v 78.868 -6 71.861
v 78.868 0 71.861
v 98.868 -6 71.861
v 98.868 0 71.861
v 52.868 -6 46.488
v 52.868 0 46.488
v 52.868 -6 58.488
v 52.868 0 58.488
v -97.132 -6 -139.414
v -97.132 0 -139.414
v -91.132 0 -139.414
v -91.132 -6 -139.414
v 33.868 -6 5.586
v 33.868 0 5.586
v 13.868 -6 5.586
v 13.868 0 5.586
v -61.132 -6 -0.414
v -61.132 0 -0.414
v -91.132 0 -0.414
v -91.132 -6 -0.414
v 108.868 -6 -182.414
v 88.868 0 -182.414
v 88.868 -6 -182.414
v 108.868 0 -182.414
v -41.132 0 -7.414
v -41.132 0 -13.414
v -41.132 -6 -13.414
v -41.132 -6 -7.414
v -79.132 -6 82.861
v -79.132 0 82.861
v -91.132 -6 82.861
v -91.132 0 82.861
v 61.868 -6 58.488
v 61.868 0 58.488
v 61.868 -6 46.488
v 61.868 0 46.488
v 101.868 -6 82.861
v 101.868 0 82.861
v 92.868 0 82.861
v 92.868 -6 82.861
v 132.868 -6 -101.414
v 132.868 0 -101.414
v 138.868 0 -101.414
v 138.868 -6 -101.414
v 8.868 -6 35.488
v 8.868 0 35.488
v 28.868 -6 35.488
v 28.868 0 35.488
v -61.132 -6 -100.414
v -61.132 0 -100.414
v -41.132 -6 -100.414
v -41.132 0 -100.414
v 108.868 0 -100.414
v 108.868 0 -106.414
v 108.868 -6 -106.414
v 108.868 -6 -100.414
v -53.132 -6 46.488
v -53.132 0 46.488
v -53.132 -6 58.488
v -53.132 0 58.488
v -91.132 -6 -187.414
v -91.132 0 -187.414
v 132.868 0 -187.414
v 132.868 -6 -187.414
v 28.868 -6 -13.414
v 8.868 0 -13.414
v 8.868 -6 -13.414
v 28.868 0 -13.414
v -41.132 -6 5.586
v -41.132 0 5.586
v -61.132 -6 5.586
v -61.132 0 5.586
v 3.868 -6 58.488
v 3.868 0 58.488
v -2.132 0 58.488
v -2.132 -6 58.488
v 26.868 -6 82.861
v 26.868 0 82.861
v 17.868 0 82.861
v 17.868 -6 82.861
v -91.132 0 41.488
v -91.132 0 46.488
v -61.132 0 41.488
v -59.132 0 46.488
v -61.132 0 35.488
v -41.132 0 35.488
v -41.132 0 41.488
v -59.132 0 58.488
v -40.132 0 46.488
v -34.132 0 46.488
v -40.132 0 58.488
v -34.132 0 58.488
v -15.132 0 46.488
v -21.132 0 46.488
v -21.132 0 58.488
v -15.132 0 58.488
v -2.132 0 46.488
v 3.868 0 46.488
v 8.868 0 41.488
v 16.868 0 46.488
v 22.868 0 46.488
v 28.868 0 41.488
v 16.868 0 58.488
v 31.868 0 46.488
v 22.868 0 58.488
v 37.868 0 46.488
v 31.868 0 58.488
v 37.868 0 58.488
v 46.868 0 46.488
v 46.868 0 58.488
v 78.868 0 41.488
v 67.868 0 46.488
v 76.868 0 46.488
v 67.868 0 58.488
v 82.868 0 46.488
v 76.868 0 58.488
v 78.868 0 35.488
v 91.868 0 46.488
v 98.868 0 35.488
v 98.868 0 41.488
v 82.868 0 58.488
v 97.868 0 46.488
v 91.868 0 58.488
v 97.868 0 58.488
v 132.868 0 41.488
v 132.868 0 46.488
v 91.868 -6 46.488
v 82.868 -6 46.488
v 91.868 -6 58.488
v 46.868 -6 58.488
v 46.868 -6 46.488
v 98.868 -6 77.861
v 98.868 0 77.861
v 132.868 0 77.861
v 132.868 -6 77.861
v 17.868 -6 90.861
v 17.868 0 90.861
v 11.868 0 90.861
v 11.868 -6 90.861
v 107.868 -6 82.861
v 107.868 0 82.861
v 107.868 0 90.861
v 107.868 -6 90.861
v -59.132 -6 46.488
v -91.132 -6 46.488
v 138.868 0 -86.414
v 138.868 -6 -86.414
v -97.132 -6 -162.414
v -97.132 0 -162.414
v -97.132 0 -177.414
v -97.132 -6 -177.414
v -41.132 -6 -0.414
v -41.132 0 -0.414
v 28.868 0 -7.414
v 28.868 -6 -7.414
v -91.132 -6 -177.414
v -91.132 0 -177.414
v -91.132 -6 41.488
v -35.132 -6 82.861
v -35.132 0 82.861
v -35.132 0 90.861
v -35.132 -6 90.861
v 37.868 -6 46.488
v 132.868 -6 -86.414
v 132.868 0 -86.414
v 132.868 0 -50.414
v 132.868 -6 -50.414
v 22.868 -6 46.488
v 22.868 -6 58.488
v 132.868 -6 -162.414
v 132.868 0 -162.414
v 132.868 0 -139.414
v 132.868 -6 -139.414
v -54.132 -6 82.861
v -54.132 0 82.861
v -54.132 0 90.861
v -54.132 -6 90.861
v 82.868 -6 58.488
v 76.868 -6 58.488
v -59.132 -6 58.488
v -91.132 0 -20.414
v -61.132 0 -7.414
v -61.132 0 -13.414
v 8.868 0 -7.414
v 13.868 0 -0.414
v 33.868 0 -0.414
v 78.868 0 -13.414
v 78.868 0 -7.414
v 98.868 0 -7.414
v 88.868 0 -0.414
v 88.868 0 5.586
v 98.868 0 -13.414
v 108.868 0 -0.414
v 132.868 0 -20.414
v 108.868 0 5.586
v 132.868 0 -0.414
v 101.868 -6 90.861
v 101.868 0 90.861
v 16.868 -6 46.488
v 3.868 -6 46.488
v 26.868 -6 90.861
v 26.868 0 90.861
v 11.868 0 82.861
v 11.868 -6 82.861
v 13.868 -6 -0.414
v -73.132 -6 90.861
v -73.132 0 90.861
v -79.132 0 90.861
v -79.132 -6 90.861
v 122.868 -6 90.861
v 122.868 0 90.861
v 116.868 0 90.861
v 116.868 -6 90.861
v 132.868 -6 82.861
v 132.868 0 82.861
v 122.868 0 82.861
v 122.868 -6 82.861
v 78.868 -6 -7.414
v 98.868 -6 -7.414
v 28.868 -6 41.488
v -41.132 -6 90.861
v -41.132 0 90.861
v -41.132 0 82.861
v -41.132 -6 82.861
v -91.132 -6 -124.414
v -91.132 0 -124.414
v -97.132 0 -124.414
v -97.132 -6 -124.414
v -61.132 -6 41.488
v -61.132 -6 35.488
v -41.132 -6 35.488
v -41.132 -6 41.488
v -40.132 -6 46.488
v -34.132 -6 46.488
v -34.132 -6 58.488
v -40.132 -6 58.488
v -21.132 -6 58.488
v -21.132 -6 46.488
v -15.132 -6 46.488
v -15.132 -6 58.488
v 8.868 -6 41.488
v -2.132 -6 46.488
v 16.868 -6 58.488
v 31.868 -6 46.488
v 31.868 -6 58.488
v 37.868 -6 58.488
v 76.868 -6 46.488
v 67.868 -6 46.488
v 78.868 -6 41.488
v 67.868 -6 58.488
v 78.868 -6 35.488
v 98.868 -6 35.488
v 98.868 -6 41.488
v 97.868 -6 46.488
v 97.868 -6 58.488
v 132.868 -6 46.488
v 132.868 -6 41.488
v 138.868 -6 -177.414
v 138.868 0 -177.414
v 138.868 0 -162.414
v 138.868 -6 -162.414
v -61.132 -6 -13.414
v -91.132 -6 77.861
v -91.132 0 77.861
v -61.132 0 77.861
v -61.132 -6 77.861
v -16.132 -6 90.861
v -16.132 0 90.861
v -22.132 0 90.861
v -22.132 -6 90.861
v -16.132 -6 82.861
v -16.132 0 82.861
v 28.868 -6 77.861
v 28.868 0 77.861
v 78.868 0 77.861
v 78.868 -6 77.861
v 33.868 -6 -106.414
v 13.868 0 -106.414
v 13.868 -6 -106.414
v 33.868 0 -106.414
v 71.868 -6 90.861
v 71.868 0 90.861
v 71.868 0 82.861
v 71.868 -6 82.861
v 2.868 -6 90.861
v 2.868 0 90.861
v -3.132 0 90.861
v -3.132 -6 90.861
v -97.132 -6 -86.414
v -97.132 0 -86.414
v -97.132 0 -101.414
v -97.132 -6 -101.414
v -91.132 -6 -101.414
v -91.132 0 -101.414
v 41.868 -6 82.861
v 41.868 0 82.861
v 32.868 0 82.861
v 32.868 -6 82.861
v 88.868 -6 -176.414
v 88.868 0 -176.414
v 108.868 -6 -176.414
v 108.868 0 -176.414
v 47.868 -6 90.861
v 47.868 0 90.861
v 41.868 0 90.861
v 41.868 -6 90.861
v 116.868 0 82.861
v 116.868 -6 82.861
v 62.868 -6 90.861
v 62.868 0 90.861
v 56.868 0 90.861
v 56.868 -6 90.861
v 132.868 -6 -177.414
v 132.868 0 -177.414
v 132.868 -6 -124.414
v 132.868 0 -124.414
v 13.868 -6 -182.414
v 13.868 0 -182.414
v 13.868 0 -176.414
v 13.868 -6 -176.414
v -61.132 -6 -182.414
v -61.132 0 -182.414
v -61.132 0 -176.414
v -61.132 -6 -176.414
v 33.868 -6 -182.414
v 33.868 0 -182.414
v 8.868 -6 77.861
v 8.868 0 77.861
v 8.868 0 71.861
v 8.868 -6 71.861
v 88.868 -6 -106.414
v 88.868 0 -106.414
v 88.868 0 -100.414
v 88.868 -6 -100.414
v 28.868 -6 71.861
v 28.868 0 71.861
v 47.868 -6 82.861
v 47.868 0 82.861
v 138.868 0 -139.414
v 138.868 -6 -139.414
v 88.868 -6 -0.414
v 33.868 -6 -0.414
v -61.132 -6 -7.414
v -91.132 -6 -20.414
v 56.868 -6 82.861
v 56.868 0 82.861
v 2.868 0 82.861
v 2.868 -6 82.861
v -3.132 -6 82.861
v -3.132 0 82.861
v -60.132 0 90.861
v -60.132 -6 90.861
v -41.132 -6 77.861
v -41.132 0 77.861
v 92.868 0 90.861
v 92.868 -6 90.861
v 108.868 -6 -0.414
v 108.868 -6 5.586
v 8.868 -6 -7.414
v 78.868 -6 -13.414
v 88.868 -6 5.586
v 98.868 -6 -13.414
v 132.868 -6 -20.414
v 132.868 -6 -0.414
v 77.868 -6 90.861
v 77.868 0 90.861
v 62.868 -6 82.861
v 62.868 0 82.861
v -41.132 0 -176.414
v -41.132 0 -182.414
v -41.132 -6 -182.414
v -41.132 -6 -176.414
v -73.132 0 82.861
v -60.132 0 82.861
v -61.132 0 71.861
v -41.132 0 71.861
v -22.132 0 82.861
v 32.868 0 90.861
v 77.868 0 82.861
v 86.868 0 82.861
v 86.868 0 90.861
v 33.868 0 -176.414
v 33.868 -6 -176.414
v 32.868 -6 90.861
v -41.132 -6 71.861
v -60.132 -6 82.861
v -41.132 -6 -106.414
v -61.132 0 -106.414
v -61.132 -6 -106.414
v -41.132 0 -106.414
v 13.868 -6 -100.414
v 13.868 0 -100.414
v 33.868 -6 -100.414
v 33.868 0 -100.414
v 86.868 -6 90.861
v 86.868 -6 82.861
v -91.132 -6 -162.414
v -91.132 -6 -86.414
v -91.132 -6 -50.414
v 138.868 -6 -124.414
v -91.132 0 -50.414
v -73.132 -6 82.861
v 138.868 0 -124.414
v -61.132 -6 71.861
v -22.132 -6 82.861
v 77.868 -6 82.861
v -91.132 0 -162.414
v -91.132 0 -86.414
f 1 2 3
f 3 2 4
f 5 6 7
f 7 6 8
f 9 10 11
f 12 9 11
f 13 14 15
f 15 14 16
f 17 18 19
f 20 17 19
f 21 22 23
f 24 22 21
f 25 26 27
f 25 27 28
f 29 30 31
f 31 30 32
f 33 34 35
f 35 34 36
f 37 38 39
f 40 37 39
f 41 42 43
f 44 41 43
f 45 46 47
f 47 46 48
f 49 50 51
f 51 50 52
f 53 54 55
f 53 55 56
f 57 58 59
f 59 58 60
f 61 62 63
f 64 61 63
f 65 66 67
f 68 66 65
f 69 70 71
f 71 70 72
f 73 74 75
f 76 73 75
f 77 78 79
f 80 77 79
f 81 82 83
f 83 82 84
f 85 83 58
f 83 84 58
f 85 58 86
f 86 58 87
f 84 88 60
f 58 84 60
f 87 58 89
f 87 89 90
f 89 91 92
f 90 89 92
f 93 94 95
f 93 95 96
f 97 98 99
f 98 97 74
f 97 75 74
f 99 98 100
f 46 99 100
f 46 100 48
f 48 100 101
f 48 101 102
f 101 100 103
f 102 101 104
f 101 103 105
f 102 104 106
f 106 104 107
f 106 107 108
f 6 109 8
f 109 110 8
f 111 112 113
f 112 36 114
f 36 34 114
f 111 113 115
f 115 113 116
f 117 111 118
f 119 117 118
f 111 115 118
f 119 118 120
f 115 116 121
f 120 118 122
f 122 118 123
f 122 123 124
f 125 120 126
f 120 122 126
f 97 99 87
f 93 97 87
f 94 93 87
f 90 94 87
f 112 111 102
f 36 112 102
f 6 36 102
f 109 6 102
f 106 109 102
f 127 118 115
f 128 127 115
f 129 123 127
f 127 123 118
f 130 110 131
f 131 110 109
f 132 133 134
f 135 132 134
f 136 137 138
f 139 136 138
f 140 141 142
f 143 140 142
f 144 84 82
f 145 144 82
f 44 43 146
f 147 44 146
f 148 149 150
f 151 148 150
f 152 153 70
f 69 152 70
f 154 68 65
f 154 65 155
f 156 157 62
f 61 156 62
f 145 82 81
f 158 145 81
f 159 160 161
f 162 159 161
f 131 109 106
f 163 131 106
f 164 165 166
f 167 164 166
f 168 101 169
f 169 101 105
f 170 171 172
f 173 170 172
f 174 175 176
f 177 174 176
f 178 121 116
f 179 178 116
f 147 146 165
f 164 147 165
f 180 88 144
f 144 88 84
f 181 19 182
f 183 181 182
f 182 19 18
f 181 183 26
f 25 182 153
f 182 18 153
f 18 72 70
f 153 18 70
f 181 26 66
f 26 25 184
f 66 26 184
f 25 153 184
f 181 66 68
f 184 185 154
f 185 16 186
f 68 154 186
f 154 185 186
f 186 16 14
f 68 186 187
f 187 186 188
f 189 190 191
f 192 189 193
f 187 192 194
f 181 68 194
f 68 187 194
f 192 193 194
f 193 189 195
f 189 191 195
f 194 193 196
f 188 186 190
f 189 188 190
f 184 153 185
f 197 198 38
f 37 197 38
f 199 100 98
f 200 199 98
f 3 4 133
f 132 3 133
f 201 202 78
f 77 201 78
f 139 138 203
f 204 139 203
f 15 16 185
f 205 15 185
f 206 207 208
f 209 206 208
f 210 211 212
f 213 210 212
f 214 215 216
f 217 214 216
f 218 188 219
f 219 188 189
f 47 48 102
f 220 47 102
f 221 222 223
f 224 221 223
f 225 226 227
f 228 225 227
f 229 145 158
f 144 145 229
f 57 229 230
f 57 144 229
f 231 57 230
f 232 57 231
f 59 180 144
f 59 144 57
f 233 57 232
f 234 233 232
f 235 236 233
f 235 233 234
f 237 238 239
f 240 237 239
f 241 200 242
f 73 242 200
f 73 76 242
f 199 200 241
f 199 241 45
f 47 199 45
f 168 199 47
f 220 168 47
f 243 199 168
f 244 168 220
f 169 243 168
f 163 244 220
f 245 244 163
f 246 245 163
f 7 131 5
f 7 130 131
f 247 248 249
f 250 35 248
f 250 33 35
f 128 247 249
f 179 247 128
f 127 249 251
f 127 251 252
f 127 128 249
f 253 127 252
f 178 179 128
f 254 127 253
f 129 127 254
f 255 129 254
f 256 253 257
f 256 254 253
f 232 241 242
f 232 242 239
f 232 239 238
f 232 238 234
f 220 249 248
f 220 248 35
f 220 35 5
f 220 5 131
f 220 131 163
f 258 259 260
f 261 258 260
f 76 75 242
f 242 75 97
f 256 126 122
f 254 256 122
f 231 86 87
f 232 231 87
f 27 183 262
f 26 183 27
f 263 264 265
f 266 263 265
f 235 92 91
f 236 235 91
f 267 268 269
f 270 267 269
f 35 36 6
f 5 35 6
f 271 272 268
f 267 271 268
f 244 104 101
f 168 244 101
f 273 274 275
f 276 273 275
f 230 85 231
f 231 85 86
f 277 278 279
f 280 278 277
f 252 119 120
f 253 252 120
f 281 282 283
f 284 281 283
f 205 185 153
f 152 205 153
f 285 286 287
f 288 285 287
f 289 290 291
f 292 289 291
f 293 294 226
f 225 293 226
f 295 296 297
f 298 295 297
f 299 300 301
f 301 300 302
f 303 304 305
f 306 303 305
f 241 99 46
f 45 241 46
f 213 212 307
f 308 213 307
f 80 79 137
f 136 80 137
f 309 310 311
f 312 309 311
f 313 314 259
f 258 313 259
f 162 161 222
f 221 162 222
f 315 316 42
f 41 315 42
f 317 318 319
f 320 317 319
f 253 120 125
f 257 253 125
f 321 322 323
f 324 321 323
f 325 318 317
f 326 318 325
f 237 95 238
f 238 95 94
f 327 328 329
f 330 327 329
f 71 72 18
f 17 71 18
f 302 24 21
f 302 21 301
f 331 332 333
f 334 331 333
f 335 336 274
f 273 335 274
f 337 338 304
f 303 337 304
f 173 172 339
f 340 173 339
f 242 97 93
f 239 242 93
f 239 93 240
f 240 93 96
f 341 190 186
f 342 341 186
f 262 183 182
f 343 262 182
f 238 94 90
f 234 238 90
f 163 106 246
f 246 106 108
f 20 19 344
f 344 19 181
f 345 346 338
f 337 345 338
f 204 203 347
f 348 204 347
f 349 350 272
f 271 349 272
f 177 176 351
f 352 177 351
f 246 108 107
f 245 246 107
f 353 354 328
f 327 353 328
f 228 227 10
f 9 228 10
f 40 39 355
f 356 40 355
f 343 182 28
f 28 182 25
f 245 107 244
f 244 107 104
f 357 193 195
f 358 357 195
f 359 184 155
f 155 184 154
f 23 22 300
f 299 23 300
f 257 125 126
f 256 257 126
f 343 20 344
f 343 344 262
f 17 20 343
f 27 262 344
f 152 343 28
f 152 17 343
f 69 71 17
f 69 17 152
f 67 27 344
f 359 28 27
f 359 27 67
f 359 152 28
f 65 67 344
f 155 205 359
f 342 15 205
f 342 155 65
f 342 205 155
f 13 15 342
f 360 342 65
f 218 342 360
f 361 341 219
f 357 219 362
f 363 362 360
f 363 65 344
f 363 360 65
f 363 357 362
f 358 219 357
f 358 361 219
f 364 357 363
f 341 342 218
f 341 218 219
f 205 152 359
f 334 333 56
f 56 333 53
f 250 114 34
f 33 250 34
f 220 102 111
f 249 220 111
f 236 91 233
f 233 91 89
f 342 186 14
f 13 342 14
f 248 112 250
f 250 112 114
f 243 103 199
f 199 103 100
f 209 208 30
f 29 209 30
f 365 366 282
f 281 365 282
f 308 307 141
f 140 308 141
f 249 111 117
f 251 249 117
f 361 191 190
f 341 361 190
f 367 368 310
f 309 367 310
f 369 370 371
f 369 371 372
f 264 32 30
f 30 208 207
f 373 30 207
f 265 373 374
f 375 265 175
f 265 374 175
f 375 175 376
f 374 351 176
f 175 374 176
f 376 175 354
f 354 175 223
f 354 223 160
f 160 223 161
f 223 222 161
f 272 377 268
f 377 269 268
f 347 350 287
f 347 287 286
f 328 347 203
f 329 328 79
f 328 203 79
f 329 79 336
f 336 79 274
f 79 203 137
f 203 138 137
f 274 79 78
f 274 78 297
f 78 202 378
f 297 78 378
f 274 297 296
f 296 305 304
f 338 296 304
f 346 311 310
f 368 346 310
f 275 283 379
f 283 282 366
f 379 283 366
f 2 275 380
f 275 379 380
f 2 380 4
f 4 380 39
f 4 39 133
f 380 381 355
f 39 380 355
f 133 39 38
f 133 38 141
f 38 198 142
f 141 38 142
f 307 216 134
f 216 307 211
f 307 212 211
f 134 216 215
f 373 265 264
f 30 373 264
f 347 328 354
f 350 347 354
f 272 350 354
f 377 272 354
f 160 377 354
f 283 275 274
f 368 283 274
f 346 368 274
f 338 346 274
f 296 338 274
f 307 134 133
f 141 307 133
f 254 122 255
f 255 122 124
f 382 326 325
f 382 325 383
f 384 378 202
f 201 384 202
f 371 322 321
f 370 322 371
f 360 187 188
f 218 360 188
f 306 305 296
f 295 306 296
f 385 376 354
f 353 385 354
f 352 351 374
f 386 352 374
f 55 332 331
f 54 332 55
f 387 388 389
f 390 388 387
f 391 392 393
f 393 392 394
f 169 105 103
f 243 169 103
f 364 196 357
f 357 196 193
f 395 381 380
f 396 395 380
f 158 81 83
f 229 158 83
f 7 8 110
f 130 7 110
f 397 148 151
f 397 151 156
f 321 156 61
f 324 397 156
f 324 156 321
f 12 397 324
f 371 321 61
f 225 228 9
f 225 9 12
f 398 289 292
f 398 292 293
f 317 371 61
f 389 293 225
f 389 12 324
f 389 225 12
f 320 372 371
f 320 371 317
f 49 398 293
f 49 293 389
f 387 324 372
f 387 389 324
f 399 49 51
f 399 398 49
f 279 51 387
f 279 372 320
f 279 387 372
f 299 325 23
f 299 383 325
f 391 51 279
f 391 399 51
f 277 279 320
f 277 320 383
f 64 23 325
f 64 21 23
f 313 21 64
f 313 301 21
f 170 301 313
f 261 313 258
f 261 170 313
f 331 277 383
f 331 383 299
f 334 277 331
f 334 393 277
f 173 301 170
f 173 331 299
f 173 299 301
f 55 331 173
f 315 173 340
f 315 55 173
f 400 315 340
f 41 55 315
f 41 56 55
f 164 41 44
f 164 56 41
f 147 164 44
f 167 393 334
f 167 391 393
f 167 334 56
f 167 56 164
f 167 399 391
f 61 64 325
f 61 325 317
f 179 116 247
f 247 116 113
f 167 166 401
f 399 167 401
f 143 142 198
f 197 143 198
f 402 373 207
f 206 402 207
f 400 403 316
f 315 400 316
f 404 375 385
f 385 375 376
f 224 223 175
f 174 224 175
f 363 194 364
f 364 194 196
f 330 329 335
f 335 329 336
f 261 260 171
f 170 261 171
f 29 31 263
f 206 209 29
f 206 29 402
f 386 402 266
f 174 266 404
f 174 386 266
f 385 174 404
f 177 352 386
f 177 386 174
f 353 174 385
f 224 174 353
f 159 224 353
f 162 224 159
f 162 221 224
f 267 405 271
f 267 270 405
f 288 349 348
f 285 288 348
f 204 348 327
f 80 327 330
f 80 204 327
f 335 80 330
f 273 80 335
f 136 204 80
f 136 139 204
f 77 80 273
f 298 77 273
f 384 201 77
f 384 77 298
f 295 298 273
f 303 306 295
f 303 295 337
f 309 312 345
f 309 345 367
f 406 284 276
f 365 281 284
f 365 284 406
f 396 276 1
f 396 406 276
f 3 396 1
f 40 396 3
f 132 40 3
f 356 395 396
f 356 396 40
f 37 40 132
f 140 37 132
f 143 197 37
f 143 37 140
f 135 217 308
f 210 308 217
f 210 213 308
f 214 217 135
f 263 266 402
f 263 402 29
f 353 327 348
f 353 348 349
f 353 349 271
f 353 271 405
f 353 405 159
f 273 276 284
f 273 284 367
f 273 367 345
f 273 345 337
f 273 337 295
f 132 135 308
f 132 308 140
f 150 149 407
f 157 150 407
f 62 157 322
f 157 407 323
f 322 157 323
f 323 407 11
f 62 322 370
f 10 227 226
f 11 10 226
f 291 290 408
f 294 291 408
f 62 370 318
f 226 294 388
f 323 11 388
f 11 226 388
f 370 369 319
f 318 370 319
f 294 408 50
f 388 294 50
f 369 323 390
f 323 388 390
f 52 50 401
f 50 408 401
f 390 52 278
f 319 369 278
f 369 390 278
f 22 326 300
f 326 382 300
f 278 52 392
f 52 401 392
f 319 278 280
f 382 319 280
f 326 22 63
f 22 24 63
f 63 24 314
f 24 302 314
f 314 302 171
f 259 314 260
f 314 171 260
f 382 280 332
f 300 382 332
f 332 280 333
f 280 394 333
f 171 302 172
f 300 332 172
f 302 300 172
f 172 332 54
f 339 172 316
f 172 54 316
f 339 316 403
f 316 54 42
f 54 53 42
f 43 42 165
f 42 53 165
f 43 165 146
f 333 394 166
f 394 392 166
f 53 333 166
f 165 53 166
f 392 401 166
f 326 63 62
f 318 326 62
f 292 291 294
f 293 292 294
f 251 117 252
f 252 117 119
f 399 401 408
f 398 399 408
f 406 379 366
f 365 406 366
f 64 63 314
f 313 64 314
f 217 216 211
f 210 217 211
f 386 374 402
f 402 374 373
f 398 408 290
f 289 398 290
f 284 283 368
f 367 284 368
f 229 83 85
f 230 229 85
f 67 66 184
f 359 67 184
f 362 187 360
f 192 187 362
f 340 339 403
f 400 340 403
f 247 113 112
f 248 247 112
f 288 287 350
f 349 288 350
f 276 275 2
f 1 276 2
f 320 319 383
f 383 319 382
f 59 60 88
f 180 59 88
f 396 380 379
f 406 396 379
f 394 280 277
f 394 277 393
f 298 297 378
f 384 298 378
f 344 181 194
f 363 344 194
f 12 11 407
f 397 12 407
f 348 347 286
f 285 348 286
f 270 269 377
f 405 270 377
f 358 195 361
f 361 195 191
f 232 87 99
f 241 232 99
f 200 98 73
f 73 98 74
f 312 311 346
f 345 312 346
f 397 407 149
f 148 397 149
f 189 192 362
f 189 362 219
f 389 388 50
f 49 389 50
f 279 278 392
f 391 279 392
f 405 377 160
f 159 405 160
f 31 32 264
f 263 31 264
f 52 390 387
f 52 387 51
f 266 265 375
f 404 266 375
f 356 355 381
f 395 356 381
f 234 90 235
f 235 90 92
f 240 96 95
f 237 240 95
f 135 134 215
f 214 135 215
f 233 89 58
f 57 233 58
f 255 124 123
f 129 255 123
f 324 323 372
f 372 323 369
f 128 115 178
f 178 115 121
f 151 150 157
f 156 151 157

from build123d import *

# Parameters (mm, degrees)
F0_W     = 20
F0_H     = 6
F1_DEPTH = 6
F2_DEPTH = 6
F3_DEPTH = 6
F4_DEPTH = 6


with BuildPart() as f1:
    # F0 (on Front) → F1 (new body)
    with BuildSketch(Plane.XZ):
        Polygon((132.867928, -50.414), (-91.132072, -50.414), (-91.132072, -86.414), (-97.132072, -86.414), (-97.132072, -101.414), (-91.132072, -101.414), (-91.132072, -124.414), (-97.132072, -124.414), (-97.132072, -139.414), (-91.132072, -139.414), (-91.132072, -162.414), (-97.132072, -162.414), (-97.132072, -177.414), (-91.132072, -177.414), (-91.132072, -187.414), (132.867928, -187.414), (132.867928, -177.414), (138.867928, -177.414), (138.867928, -162.414), (132.867928, -162.414), (132.867928, -139.414), (138.867928, -139.414), (138.867928, -124.414), (132.867928, -124.414), (132.867928, -101.414), (138.867928, -101.414), (138.867928, -86.414), (132.867928, -86.414), align=None)
        with Locations((-51.132072, -179.414)):
            Rectangle(F0_W, F0_H, mode=Mode.SUBTRACT)
        with Locations((-51.132072, -103.414)):
            Rectangle(F0_W, F0_H, mode=Mode.SUBTRACT)
        with Locations((23.867928, -179.414)):
            Rectangle(F0_W, F0_H, mode=Mode.SUBTRACT)
        with Locations((98.867928, -179.414)):
            Rectangle(F0_W, F0_H, mode=Mode.SUBTRACT)
        with Locations((23.867928, -103.414)):
            Rectangle(F0_W, F0_H, mode=Mode.SUBTRACT)
        with Locations((98.867928, -103.414)):
            Rectangle(F0_W, F0_H, mode=Mode.SUBTRACT)
    extrude(amount=F1_DEPTH)


with BuildPart() as f2:
    # F0 (on Front) → F2 (new body)
    with BuildSketch(Plane.XZ):
        Polygon((-61.132072, -0.414), (-91.132072, -0.414), (-91.132072, -20.414), (132.867928, -20.414), (132.867928, -0.414), (108.867928, -0.414), (108.867928, 5.586), (88.867928, 5.586), (88.867928, -0.414), (33.867928, -0.414), (33.867928, 5.586), (13.867928, 5.586), (13.867928, -0.414), (-41.132072, -0.414), (-41.132072, 5.586), (-61.132072, 5.586), align=None)
        with Locations((-51.132072, -10.414)):
            Rectangle(F0_W, F0_H, mode=Mode.SUBTRACT)
        with Locations((18.867928, -10.414)):
            Rectangle(F0_W, F0_H, mode=Mode.SUBTRACT)
        with Locations((88.867928, -10.414)):
            Rectangle(F0_W, F0_H, mode=Mode.SUBTRACT)
    extrude(amount=F2_DEPTH)


with BuildPart() as f3:
    # F0 (on Front) → F3 (new body)
    with BuildSketch(Plane.XZ):
        Polygon((16.867928, 58.488489), (16.867928, 46.488489), (3.867928, 46.488489), (3.867928, 58.488489), (-2.132072, 58.488489), (-2.132072, 46.488489), (-15.132072, 46.488489), (-15.132072, 58.488489), (-21.132072, 58.488489), (-21.132072, 46.488489), (-34.132072, 46.488489), (-34.132072, 58.488489), (-40.132072, 58.488489), (-40.132072, 46.488489), (-53.132072, 46.488489), (-53.132072, 58.488489), (-59.132072, 58.488489), (-59.132072, 46.488489), (-91.132072, 46.488489), (-91.132072, 41.488489), (-61.132072, 41.488489), (-61.132072, 35.488489), (-41.132072, 35.488489), (-41.132072, 41.488489), (8.867928, 41.488489), (8.867928, 35.488489), (28.867928, 35.488489), (28.867928, 41.488489), (78.867928, 41.488489), (78.867928, 35.488489), (98.867928, 35.488489), (98.867928, 41.488489), (132.867928, 41.488489), (132.867928, 46.488489), (97.867928, 46.488489), (97.867928, 58.488489), (91.867928, 58.488489), (91.867928, 46.488489), (82.867928, 46.488489), (82.867928, 58.488489), (76.867928, 58.488489), (76.867928, 46.488489), (67.867928, 46.488489), (67.867928, 58.488489), (61.867928, 58.488489), (61.867928, 46.488489), (52.867928, 46.488489), (52.867928, 58.488489), (46.867928, 58.488489), (46.867928, 46.488489), (37.867928, 46.488489), (37.867928, 58.488489), (31.867928, 58.488489), (31.867928, 46.488489), (22.867928, 46.488489), (22.867928, 58.488489), align=None)
    extrude(amount=F3_DEPTH)


with BuildPart() as f4:
    # F0 (on Front) → F4 (new body)
    with BuildSketch(Plane.XZ):
        Polygon((-79.132072, 90.861088), (-79.132072, 82.861088), (-91.132072, 82.861088), (-91.132072, 77.861088), (-61.132072, 77.861088), (-61.132072, 71.861088), (-41.132072, 71.861088), (-41.132072, 77.861088), (8.867928, 77.861088), (8.867928, 71.861088), (28.867928, 71.861088), (28.867928, 77.861088), (78.867928, 77.861088), (78.867928, 71.861088), (98.867928, 71.861088), (98.867928, 77.861088), (132.867928, 77.861088), (132.867928, 82.861088), (122.867928, 82.861088), (122.867928, 90.861088), (116.867928, 90.861088), (116.867928, 82.861088), (107.867928, 82.861088), (107.867928, 90.861088), (101.867928, 90.861088), (101.867928, 82.861088), (92.867928, 82.861088), (92.867928, 90.861088), (86.867928, 90.861088), (86.867928, 82.861088), (77.867928, 82.861088), (77.867928, 90.861088), (71.867928, 90.861088), (71.867928, 82.861088), (62.867928, 82.861088), (62.867928, 90.861088), (56.867928, 90.861088), (56.867928, 82.861088), (47.867928, 82.861088), (47.867928, 90.861088), (41.867928, 90.861088), (41.867928, 82.861088), (32.867928, 82.861088), (32.867928, 90.861088), (26.867928, 90.861088), (26.867928, 82.861088), (17.867928, 82.861088), (17.867928, 90.861088), (11.867928, 90.861088), (11.867928, 82.861088), (2.867928, 82.861088), (2.867928, 90.861088), (-3.132072, 90.861088), (-3.132072, 82.861088), (-16.132072, 82.861088), (-16.132072, 90.861088), (-22.132072, 90.861088), (-22.132072, 82.861088), (-35.132072, 82.861088), (-35.132072, 90.861088), (-41.132072, 90.861088), (-41.132072, 82.861088), (-54.132072, 82.861088), (-54.132072, 90.861088), (-60.132072, 90.861088), (-60.132072, 82.861088), (-73.132072, 82.861088), (-73.132072, 90.861088), align=None)
    extrude(amount=F4_DEPTH)


solid = Compound([f1.part, f2.part, f3.part, f4.part])
